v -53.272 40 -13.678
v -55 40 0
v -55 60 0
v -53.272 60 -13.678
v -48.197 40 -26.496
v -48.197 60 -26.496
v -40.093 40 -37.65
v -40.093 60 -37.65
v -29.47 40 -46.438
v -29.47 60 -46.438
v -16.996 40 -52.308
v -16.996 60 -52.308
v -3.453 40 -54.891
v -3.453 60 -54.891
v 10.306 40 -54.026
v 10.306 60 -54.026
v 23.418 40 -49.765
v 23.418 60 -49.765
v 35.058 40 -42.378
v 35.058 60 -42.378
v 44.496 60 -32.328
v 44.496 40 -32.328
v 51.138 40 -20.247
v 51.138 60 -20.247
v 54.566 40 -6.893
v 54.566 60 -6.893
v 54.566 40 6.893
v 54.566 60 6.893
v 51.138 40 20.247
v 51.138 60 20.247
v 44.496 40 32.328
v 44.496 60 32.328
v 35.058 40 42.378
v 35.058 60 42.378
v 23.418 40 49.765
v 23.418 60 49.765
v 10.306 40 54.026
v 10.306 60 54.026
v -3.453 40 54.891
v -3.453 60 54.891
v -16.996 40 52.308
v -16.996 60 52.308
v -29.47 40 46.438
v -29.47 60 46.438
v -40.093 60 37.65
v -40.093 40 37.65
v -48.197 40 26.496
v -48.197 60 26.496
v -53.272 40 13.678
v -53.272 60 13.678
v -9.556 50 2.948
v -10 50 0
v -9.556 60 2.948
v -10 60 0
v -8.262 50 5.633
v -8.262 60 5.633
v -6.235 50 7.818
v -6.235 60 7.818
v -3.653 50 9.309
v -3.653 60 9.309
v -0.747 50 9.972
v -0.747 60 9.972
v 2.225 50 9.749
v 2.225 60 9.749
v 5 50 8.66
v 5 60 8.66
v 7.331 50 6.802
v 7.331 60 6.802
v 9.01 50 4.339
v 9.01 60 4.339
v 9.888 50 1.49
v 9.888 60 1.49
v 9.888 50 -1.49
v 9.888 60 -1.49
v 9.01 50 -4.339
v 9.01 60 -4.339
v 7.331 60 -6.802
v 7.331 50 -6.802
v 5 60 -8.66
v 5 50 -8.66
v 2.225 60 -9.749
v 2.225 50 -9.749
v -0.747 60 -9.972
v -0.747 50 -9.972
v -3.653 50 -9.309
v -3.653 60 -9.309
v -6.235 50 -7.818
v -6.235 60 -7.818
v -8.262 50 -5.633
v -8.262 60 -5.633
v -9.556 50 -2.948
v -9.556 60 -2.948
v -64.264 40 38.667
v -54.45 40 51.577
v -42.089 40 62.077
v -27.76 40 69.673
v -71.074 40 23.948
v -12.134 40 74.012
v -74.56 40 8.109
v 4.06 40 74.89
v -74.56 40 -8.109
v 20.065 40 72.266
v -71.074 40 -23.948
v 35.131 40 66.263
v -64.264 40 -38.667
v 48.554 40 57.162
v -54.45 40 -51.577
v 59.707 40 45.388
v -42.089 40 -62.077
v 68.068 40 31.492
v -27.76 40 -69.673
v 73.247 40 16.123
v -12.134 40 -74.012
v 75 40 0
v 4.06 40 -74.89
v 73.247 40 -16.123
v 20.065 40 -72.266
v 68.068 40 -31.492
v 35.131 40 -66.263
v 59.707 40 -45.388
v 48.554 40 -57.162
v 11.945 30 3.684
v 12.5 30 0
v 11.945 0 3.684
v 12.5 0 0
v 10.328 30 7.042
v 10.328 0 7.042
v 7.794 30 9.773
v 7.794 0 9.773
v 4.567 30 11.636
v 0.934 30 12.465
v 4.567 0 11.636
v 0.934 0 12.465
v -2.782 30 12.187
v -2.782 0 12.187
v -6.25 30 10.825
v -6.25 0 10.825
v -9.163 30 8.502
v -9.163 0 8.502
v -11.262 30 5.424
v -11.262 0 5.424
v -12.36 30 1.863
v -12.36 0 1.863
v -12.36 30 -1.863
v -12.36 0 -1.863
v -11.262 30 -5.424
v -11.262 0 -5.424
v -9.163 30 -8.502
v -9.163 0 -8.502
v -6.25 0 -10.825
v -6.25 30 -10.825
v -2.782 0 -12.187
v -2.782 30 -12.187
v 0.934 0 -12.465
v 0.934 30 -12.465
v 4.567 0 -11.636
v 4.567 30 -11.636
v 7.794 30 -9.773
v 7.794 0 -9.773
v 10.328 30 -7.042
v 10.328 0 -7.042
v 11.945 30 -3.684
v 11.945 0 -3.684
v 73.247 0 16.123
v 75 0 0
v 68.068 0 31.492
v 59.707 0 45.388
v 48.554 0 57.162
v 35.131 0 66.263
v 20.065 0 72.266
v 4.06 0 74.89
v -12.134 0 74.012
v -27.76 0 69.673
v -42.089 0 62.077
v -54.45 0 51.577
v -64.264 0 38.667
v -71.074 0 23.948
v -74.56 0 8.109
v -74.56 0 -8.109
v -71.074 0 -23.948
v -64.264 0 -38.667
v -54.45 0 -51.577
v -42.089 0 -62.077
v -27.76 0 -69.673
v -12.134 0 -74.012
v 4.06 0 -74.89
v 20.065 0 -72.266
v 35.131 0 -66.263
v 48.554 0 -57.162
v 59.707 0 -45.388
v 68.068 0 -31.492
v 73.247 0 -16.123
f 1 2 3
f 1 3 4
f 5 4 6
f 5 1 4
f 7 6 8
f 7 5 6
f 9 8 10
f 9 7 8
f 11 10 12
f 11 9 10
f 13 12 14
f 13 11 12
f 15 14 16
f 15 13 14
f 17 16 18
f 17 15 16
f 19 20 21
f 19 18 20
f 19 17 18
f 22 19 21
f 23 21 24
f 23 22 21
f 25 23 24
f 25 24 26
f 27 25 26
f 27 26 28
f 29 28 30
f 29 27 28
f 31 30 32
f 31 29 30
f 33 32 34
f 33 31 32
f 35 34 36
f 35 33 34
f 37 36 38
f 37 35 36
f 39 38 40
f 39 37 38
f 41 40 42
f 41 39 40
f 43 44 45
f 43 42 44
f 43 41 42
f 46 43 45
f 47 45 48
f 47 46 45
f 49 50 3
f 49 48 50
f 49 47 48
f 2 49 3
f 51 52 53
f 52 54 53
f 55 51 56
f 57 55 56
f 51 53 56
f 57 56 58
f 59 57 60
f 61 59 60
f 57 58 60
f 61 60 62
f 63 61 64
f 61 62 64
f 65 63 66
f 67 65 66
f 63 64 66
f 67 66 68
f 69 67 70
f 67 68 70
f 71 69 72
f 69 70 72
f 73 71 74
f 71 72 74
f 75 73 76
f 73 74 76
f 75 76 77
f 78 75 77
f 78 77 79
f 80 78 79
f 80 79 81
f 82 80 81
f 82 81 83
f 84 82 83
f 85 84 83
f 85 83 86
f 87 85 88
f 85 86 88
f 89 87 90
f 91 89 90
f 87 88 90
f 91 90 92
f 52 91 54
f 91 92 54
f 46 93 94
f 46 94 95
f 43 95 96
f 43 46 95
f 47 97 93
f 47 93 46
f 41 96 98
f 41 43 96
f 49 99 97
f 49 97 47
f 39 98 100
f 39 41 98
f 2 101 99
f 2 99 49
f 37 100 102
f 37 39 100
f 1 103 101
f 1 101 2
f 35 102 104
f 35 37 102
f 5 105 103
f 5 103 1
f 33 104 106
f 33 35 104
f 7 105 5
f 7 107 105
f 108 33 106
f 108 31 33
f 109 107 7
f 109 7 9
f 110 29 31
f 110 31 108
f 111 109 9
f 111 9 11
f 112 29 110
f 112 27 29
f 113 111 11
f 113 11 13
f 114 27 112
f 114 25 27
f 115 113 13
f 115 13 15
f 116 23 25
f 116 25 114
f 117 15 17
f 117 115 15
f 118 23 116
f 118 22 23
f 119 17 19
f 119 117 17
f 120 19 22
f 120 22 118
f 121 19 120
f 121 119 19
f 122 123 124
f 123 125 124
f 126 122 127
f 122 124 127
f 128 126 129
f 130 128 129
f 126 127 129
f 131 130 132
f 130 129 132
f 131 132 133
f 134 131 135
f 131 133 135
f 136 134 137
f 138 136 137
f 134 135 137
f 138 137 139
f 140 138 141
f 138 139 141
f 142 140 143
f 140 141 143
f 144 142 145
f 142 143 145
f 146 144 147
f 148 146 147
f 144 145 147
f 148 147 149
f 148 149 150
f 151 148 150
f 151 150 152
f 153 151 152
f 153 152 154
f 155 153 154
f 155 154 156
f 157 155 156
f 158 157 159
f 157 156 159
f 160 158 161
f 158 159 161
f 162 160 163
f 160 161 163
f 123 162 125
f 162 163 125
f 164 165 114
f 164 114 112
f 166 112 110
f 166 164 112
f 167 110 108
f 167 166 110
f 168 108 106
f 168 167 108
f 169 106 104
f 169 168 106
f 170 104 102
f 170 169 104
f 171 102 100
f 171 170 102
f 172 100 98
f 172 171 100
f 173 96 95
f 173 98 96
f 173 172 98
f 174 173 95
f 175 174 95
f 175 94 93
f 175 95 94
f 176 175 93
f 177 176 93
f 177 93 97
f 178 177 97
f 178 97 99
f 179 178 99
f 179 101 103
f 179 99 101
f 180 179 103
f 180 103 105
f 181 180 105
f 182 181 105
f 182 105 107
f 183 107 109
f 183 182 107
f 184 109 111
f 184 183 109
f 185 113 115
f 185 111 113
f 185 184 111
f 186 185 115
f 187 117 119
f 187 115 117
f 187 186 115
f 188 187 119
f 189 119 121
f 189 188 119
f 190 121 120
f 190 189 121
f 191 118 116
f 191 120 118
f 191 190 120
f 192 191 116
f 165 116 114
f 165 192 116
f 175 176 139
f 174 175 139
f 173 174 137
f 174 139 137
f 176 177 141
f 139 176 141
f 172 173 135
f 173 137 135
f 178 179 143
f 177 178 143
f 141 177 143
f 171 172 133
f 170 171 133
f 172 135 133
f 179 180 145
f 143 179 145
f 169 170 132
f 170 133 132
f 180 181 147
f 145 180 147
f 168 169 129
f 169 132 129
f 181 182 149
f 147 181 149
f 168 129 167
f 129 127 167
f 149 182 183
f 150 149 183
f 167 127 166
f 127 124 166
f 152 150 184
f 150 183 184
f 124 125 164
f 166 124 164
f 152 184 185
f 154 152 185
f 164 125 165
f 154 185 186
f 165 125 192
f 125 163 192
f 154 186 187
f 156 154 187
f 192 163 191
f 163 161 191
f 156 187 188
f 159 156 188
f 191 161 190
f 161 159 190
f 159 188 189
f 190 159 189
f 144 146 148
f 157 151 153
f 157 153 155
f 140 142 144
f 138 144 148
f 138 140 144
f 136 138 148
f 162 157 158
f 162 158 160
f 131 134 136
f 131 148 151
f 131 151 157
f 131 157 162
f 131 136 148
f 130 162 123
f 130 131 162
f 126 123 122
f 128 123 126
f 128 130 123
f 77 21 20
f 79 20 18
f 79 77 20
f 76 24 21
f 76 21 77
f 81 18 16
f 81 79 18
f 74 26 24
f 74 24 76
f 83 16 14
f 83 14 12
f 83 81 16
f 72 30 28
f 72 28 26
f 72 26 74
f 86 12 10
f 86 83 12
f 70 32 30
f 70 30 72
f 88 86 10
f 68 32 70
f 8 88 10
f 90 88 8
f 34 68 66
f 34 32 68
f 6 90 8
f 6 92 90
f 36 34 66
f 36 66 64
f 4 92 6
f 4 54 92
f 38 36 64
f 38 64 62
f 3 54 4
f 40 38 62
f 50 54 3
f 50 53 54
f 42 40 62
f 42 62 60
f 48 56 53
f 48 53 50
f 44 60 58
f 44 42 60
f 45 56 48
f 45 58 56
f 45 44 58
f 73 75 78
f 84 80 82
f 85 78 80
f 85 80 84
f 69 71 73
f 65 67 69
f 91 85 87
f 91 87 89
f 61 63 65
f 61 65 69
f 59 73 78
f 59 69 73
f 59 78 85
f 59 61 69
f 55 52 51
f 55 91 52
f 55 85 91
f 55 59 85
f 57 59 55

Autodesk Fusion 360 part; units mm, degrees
sketch "Sketch1" plane through (0, 0, 0) normal (0, 1, 0) x (1, 0, 0)
  circle A0 centre (0, 0) radius 75
  dimension "d1" = 150
extrude "Extrude1" add sketch "Sketch1" along normal blind 40 makes body 1
sketch "Sketch2" plane through (0, 40, 0) normal (0, 1, 0) x (-1, 0, 0)
  circle A0 centre (0, 0) radius 75
  circle A1 centre (0, 0) radius 55
  dimension "d4" = 110
extrude "Extrude2" add sketch "Sketch2" along normal blind 20 contours A1 bodies 1
sketch "Sketch3" plane through (0, 60, 0) normal (0, 1, 0) x (-1, 0, 0)
  circle A0 centre (0, 0) radius 55
sketch "Sketch4" plane through (0, 60, 0) normal (0, 1, 0) x (-1, 0, 0)
  circle A0 centre (0, 0) radius 10
  dimension "d7" = 20
extrude "Extrude3" cut sketch "Sketch4" against normal blind 10 bodies 1
sketch "Sketch6" plane through (0, 0, 0) normal (0, -1, 0) x (1, 0, 0)
  circle A0 centre (0, 0) radius 75
  circle A1 centre (0, 0) radius 12.5
  dimension "d10" = 25
extrude "Extrude4" cut sketch "Sketch6" against normal blind 30 contours A1 bodies 1
copy_body "Body->Comp1" bodies 1 removing the originals makes body 2 in component "Component"
component "Component" placed x (1, 0, 0) y (0, 1, 0) z (0, 0, 1) at (0, 0, 0)
